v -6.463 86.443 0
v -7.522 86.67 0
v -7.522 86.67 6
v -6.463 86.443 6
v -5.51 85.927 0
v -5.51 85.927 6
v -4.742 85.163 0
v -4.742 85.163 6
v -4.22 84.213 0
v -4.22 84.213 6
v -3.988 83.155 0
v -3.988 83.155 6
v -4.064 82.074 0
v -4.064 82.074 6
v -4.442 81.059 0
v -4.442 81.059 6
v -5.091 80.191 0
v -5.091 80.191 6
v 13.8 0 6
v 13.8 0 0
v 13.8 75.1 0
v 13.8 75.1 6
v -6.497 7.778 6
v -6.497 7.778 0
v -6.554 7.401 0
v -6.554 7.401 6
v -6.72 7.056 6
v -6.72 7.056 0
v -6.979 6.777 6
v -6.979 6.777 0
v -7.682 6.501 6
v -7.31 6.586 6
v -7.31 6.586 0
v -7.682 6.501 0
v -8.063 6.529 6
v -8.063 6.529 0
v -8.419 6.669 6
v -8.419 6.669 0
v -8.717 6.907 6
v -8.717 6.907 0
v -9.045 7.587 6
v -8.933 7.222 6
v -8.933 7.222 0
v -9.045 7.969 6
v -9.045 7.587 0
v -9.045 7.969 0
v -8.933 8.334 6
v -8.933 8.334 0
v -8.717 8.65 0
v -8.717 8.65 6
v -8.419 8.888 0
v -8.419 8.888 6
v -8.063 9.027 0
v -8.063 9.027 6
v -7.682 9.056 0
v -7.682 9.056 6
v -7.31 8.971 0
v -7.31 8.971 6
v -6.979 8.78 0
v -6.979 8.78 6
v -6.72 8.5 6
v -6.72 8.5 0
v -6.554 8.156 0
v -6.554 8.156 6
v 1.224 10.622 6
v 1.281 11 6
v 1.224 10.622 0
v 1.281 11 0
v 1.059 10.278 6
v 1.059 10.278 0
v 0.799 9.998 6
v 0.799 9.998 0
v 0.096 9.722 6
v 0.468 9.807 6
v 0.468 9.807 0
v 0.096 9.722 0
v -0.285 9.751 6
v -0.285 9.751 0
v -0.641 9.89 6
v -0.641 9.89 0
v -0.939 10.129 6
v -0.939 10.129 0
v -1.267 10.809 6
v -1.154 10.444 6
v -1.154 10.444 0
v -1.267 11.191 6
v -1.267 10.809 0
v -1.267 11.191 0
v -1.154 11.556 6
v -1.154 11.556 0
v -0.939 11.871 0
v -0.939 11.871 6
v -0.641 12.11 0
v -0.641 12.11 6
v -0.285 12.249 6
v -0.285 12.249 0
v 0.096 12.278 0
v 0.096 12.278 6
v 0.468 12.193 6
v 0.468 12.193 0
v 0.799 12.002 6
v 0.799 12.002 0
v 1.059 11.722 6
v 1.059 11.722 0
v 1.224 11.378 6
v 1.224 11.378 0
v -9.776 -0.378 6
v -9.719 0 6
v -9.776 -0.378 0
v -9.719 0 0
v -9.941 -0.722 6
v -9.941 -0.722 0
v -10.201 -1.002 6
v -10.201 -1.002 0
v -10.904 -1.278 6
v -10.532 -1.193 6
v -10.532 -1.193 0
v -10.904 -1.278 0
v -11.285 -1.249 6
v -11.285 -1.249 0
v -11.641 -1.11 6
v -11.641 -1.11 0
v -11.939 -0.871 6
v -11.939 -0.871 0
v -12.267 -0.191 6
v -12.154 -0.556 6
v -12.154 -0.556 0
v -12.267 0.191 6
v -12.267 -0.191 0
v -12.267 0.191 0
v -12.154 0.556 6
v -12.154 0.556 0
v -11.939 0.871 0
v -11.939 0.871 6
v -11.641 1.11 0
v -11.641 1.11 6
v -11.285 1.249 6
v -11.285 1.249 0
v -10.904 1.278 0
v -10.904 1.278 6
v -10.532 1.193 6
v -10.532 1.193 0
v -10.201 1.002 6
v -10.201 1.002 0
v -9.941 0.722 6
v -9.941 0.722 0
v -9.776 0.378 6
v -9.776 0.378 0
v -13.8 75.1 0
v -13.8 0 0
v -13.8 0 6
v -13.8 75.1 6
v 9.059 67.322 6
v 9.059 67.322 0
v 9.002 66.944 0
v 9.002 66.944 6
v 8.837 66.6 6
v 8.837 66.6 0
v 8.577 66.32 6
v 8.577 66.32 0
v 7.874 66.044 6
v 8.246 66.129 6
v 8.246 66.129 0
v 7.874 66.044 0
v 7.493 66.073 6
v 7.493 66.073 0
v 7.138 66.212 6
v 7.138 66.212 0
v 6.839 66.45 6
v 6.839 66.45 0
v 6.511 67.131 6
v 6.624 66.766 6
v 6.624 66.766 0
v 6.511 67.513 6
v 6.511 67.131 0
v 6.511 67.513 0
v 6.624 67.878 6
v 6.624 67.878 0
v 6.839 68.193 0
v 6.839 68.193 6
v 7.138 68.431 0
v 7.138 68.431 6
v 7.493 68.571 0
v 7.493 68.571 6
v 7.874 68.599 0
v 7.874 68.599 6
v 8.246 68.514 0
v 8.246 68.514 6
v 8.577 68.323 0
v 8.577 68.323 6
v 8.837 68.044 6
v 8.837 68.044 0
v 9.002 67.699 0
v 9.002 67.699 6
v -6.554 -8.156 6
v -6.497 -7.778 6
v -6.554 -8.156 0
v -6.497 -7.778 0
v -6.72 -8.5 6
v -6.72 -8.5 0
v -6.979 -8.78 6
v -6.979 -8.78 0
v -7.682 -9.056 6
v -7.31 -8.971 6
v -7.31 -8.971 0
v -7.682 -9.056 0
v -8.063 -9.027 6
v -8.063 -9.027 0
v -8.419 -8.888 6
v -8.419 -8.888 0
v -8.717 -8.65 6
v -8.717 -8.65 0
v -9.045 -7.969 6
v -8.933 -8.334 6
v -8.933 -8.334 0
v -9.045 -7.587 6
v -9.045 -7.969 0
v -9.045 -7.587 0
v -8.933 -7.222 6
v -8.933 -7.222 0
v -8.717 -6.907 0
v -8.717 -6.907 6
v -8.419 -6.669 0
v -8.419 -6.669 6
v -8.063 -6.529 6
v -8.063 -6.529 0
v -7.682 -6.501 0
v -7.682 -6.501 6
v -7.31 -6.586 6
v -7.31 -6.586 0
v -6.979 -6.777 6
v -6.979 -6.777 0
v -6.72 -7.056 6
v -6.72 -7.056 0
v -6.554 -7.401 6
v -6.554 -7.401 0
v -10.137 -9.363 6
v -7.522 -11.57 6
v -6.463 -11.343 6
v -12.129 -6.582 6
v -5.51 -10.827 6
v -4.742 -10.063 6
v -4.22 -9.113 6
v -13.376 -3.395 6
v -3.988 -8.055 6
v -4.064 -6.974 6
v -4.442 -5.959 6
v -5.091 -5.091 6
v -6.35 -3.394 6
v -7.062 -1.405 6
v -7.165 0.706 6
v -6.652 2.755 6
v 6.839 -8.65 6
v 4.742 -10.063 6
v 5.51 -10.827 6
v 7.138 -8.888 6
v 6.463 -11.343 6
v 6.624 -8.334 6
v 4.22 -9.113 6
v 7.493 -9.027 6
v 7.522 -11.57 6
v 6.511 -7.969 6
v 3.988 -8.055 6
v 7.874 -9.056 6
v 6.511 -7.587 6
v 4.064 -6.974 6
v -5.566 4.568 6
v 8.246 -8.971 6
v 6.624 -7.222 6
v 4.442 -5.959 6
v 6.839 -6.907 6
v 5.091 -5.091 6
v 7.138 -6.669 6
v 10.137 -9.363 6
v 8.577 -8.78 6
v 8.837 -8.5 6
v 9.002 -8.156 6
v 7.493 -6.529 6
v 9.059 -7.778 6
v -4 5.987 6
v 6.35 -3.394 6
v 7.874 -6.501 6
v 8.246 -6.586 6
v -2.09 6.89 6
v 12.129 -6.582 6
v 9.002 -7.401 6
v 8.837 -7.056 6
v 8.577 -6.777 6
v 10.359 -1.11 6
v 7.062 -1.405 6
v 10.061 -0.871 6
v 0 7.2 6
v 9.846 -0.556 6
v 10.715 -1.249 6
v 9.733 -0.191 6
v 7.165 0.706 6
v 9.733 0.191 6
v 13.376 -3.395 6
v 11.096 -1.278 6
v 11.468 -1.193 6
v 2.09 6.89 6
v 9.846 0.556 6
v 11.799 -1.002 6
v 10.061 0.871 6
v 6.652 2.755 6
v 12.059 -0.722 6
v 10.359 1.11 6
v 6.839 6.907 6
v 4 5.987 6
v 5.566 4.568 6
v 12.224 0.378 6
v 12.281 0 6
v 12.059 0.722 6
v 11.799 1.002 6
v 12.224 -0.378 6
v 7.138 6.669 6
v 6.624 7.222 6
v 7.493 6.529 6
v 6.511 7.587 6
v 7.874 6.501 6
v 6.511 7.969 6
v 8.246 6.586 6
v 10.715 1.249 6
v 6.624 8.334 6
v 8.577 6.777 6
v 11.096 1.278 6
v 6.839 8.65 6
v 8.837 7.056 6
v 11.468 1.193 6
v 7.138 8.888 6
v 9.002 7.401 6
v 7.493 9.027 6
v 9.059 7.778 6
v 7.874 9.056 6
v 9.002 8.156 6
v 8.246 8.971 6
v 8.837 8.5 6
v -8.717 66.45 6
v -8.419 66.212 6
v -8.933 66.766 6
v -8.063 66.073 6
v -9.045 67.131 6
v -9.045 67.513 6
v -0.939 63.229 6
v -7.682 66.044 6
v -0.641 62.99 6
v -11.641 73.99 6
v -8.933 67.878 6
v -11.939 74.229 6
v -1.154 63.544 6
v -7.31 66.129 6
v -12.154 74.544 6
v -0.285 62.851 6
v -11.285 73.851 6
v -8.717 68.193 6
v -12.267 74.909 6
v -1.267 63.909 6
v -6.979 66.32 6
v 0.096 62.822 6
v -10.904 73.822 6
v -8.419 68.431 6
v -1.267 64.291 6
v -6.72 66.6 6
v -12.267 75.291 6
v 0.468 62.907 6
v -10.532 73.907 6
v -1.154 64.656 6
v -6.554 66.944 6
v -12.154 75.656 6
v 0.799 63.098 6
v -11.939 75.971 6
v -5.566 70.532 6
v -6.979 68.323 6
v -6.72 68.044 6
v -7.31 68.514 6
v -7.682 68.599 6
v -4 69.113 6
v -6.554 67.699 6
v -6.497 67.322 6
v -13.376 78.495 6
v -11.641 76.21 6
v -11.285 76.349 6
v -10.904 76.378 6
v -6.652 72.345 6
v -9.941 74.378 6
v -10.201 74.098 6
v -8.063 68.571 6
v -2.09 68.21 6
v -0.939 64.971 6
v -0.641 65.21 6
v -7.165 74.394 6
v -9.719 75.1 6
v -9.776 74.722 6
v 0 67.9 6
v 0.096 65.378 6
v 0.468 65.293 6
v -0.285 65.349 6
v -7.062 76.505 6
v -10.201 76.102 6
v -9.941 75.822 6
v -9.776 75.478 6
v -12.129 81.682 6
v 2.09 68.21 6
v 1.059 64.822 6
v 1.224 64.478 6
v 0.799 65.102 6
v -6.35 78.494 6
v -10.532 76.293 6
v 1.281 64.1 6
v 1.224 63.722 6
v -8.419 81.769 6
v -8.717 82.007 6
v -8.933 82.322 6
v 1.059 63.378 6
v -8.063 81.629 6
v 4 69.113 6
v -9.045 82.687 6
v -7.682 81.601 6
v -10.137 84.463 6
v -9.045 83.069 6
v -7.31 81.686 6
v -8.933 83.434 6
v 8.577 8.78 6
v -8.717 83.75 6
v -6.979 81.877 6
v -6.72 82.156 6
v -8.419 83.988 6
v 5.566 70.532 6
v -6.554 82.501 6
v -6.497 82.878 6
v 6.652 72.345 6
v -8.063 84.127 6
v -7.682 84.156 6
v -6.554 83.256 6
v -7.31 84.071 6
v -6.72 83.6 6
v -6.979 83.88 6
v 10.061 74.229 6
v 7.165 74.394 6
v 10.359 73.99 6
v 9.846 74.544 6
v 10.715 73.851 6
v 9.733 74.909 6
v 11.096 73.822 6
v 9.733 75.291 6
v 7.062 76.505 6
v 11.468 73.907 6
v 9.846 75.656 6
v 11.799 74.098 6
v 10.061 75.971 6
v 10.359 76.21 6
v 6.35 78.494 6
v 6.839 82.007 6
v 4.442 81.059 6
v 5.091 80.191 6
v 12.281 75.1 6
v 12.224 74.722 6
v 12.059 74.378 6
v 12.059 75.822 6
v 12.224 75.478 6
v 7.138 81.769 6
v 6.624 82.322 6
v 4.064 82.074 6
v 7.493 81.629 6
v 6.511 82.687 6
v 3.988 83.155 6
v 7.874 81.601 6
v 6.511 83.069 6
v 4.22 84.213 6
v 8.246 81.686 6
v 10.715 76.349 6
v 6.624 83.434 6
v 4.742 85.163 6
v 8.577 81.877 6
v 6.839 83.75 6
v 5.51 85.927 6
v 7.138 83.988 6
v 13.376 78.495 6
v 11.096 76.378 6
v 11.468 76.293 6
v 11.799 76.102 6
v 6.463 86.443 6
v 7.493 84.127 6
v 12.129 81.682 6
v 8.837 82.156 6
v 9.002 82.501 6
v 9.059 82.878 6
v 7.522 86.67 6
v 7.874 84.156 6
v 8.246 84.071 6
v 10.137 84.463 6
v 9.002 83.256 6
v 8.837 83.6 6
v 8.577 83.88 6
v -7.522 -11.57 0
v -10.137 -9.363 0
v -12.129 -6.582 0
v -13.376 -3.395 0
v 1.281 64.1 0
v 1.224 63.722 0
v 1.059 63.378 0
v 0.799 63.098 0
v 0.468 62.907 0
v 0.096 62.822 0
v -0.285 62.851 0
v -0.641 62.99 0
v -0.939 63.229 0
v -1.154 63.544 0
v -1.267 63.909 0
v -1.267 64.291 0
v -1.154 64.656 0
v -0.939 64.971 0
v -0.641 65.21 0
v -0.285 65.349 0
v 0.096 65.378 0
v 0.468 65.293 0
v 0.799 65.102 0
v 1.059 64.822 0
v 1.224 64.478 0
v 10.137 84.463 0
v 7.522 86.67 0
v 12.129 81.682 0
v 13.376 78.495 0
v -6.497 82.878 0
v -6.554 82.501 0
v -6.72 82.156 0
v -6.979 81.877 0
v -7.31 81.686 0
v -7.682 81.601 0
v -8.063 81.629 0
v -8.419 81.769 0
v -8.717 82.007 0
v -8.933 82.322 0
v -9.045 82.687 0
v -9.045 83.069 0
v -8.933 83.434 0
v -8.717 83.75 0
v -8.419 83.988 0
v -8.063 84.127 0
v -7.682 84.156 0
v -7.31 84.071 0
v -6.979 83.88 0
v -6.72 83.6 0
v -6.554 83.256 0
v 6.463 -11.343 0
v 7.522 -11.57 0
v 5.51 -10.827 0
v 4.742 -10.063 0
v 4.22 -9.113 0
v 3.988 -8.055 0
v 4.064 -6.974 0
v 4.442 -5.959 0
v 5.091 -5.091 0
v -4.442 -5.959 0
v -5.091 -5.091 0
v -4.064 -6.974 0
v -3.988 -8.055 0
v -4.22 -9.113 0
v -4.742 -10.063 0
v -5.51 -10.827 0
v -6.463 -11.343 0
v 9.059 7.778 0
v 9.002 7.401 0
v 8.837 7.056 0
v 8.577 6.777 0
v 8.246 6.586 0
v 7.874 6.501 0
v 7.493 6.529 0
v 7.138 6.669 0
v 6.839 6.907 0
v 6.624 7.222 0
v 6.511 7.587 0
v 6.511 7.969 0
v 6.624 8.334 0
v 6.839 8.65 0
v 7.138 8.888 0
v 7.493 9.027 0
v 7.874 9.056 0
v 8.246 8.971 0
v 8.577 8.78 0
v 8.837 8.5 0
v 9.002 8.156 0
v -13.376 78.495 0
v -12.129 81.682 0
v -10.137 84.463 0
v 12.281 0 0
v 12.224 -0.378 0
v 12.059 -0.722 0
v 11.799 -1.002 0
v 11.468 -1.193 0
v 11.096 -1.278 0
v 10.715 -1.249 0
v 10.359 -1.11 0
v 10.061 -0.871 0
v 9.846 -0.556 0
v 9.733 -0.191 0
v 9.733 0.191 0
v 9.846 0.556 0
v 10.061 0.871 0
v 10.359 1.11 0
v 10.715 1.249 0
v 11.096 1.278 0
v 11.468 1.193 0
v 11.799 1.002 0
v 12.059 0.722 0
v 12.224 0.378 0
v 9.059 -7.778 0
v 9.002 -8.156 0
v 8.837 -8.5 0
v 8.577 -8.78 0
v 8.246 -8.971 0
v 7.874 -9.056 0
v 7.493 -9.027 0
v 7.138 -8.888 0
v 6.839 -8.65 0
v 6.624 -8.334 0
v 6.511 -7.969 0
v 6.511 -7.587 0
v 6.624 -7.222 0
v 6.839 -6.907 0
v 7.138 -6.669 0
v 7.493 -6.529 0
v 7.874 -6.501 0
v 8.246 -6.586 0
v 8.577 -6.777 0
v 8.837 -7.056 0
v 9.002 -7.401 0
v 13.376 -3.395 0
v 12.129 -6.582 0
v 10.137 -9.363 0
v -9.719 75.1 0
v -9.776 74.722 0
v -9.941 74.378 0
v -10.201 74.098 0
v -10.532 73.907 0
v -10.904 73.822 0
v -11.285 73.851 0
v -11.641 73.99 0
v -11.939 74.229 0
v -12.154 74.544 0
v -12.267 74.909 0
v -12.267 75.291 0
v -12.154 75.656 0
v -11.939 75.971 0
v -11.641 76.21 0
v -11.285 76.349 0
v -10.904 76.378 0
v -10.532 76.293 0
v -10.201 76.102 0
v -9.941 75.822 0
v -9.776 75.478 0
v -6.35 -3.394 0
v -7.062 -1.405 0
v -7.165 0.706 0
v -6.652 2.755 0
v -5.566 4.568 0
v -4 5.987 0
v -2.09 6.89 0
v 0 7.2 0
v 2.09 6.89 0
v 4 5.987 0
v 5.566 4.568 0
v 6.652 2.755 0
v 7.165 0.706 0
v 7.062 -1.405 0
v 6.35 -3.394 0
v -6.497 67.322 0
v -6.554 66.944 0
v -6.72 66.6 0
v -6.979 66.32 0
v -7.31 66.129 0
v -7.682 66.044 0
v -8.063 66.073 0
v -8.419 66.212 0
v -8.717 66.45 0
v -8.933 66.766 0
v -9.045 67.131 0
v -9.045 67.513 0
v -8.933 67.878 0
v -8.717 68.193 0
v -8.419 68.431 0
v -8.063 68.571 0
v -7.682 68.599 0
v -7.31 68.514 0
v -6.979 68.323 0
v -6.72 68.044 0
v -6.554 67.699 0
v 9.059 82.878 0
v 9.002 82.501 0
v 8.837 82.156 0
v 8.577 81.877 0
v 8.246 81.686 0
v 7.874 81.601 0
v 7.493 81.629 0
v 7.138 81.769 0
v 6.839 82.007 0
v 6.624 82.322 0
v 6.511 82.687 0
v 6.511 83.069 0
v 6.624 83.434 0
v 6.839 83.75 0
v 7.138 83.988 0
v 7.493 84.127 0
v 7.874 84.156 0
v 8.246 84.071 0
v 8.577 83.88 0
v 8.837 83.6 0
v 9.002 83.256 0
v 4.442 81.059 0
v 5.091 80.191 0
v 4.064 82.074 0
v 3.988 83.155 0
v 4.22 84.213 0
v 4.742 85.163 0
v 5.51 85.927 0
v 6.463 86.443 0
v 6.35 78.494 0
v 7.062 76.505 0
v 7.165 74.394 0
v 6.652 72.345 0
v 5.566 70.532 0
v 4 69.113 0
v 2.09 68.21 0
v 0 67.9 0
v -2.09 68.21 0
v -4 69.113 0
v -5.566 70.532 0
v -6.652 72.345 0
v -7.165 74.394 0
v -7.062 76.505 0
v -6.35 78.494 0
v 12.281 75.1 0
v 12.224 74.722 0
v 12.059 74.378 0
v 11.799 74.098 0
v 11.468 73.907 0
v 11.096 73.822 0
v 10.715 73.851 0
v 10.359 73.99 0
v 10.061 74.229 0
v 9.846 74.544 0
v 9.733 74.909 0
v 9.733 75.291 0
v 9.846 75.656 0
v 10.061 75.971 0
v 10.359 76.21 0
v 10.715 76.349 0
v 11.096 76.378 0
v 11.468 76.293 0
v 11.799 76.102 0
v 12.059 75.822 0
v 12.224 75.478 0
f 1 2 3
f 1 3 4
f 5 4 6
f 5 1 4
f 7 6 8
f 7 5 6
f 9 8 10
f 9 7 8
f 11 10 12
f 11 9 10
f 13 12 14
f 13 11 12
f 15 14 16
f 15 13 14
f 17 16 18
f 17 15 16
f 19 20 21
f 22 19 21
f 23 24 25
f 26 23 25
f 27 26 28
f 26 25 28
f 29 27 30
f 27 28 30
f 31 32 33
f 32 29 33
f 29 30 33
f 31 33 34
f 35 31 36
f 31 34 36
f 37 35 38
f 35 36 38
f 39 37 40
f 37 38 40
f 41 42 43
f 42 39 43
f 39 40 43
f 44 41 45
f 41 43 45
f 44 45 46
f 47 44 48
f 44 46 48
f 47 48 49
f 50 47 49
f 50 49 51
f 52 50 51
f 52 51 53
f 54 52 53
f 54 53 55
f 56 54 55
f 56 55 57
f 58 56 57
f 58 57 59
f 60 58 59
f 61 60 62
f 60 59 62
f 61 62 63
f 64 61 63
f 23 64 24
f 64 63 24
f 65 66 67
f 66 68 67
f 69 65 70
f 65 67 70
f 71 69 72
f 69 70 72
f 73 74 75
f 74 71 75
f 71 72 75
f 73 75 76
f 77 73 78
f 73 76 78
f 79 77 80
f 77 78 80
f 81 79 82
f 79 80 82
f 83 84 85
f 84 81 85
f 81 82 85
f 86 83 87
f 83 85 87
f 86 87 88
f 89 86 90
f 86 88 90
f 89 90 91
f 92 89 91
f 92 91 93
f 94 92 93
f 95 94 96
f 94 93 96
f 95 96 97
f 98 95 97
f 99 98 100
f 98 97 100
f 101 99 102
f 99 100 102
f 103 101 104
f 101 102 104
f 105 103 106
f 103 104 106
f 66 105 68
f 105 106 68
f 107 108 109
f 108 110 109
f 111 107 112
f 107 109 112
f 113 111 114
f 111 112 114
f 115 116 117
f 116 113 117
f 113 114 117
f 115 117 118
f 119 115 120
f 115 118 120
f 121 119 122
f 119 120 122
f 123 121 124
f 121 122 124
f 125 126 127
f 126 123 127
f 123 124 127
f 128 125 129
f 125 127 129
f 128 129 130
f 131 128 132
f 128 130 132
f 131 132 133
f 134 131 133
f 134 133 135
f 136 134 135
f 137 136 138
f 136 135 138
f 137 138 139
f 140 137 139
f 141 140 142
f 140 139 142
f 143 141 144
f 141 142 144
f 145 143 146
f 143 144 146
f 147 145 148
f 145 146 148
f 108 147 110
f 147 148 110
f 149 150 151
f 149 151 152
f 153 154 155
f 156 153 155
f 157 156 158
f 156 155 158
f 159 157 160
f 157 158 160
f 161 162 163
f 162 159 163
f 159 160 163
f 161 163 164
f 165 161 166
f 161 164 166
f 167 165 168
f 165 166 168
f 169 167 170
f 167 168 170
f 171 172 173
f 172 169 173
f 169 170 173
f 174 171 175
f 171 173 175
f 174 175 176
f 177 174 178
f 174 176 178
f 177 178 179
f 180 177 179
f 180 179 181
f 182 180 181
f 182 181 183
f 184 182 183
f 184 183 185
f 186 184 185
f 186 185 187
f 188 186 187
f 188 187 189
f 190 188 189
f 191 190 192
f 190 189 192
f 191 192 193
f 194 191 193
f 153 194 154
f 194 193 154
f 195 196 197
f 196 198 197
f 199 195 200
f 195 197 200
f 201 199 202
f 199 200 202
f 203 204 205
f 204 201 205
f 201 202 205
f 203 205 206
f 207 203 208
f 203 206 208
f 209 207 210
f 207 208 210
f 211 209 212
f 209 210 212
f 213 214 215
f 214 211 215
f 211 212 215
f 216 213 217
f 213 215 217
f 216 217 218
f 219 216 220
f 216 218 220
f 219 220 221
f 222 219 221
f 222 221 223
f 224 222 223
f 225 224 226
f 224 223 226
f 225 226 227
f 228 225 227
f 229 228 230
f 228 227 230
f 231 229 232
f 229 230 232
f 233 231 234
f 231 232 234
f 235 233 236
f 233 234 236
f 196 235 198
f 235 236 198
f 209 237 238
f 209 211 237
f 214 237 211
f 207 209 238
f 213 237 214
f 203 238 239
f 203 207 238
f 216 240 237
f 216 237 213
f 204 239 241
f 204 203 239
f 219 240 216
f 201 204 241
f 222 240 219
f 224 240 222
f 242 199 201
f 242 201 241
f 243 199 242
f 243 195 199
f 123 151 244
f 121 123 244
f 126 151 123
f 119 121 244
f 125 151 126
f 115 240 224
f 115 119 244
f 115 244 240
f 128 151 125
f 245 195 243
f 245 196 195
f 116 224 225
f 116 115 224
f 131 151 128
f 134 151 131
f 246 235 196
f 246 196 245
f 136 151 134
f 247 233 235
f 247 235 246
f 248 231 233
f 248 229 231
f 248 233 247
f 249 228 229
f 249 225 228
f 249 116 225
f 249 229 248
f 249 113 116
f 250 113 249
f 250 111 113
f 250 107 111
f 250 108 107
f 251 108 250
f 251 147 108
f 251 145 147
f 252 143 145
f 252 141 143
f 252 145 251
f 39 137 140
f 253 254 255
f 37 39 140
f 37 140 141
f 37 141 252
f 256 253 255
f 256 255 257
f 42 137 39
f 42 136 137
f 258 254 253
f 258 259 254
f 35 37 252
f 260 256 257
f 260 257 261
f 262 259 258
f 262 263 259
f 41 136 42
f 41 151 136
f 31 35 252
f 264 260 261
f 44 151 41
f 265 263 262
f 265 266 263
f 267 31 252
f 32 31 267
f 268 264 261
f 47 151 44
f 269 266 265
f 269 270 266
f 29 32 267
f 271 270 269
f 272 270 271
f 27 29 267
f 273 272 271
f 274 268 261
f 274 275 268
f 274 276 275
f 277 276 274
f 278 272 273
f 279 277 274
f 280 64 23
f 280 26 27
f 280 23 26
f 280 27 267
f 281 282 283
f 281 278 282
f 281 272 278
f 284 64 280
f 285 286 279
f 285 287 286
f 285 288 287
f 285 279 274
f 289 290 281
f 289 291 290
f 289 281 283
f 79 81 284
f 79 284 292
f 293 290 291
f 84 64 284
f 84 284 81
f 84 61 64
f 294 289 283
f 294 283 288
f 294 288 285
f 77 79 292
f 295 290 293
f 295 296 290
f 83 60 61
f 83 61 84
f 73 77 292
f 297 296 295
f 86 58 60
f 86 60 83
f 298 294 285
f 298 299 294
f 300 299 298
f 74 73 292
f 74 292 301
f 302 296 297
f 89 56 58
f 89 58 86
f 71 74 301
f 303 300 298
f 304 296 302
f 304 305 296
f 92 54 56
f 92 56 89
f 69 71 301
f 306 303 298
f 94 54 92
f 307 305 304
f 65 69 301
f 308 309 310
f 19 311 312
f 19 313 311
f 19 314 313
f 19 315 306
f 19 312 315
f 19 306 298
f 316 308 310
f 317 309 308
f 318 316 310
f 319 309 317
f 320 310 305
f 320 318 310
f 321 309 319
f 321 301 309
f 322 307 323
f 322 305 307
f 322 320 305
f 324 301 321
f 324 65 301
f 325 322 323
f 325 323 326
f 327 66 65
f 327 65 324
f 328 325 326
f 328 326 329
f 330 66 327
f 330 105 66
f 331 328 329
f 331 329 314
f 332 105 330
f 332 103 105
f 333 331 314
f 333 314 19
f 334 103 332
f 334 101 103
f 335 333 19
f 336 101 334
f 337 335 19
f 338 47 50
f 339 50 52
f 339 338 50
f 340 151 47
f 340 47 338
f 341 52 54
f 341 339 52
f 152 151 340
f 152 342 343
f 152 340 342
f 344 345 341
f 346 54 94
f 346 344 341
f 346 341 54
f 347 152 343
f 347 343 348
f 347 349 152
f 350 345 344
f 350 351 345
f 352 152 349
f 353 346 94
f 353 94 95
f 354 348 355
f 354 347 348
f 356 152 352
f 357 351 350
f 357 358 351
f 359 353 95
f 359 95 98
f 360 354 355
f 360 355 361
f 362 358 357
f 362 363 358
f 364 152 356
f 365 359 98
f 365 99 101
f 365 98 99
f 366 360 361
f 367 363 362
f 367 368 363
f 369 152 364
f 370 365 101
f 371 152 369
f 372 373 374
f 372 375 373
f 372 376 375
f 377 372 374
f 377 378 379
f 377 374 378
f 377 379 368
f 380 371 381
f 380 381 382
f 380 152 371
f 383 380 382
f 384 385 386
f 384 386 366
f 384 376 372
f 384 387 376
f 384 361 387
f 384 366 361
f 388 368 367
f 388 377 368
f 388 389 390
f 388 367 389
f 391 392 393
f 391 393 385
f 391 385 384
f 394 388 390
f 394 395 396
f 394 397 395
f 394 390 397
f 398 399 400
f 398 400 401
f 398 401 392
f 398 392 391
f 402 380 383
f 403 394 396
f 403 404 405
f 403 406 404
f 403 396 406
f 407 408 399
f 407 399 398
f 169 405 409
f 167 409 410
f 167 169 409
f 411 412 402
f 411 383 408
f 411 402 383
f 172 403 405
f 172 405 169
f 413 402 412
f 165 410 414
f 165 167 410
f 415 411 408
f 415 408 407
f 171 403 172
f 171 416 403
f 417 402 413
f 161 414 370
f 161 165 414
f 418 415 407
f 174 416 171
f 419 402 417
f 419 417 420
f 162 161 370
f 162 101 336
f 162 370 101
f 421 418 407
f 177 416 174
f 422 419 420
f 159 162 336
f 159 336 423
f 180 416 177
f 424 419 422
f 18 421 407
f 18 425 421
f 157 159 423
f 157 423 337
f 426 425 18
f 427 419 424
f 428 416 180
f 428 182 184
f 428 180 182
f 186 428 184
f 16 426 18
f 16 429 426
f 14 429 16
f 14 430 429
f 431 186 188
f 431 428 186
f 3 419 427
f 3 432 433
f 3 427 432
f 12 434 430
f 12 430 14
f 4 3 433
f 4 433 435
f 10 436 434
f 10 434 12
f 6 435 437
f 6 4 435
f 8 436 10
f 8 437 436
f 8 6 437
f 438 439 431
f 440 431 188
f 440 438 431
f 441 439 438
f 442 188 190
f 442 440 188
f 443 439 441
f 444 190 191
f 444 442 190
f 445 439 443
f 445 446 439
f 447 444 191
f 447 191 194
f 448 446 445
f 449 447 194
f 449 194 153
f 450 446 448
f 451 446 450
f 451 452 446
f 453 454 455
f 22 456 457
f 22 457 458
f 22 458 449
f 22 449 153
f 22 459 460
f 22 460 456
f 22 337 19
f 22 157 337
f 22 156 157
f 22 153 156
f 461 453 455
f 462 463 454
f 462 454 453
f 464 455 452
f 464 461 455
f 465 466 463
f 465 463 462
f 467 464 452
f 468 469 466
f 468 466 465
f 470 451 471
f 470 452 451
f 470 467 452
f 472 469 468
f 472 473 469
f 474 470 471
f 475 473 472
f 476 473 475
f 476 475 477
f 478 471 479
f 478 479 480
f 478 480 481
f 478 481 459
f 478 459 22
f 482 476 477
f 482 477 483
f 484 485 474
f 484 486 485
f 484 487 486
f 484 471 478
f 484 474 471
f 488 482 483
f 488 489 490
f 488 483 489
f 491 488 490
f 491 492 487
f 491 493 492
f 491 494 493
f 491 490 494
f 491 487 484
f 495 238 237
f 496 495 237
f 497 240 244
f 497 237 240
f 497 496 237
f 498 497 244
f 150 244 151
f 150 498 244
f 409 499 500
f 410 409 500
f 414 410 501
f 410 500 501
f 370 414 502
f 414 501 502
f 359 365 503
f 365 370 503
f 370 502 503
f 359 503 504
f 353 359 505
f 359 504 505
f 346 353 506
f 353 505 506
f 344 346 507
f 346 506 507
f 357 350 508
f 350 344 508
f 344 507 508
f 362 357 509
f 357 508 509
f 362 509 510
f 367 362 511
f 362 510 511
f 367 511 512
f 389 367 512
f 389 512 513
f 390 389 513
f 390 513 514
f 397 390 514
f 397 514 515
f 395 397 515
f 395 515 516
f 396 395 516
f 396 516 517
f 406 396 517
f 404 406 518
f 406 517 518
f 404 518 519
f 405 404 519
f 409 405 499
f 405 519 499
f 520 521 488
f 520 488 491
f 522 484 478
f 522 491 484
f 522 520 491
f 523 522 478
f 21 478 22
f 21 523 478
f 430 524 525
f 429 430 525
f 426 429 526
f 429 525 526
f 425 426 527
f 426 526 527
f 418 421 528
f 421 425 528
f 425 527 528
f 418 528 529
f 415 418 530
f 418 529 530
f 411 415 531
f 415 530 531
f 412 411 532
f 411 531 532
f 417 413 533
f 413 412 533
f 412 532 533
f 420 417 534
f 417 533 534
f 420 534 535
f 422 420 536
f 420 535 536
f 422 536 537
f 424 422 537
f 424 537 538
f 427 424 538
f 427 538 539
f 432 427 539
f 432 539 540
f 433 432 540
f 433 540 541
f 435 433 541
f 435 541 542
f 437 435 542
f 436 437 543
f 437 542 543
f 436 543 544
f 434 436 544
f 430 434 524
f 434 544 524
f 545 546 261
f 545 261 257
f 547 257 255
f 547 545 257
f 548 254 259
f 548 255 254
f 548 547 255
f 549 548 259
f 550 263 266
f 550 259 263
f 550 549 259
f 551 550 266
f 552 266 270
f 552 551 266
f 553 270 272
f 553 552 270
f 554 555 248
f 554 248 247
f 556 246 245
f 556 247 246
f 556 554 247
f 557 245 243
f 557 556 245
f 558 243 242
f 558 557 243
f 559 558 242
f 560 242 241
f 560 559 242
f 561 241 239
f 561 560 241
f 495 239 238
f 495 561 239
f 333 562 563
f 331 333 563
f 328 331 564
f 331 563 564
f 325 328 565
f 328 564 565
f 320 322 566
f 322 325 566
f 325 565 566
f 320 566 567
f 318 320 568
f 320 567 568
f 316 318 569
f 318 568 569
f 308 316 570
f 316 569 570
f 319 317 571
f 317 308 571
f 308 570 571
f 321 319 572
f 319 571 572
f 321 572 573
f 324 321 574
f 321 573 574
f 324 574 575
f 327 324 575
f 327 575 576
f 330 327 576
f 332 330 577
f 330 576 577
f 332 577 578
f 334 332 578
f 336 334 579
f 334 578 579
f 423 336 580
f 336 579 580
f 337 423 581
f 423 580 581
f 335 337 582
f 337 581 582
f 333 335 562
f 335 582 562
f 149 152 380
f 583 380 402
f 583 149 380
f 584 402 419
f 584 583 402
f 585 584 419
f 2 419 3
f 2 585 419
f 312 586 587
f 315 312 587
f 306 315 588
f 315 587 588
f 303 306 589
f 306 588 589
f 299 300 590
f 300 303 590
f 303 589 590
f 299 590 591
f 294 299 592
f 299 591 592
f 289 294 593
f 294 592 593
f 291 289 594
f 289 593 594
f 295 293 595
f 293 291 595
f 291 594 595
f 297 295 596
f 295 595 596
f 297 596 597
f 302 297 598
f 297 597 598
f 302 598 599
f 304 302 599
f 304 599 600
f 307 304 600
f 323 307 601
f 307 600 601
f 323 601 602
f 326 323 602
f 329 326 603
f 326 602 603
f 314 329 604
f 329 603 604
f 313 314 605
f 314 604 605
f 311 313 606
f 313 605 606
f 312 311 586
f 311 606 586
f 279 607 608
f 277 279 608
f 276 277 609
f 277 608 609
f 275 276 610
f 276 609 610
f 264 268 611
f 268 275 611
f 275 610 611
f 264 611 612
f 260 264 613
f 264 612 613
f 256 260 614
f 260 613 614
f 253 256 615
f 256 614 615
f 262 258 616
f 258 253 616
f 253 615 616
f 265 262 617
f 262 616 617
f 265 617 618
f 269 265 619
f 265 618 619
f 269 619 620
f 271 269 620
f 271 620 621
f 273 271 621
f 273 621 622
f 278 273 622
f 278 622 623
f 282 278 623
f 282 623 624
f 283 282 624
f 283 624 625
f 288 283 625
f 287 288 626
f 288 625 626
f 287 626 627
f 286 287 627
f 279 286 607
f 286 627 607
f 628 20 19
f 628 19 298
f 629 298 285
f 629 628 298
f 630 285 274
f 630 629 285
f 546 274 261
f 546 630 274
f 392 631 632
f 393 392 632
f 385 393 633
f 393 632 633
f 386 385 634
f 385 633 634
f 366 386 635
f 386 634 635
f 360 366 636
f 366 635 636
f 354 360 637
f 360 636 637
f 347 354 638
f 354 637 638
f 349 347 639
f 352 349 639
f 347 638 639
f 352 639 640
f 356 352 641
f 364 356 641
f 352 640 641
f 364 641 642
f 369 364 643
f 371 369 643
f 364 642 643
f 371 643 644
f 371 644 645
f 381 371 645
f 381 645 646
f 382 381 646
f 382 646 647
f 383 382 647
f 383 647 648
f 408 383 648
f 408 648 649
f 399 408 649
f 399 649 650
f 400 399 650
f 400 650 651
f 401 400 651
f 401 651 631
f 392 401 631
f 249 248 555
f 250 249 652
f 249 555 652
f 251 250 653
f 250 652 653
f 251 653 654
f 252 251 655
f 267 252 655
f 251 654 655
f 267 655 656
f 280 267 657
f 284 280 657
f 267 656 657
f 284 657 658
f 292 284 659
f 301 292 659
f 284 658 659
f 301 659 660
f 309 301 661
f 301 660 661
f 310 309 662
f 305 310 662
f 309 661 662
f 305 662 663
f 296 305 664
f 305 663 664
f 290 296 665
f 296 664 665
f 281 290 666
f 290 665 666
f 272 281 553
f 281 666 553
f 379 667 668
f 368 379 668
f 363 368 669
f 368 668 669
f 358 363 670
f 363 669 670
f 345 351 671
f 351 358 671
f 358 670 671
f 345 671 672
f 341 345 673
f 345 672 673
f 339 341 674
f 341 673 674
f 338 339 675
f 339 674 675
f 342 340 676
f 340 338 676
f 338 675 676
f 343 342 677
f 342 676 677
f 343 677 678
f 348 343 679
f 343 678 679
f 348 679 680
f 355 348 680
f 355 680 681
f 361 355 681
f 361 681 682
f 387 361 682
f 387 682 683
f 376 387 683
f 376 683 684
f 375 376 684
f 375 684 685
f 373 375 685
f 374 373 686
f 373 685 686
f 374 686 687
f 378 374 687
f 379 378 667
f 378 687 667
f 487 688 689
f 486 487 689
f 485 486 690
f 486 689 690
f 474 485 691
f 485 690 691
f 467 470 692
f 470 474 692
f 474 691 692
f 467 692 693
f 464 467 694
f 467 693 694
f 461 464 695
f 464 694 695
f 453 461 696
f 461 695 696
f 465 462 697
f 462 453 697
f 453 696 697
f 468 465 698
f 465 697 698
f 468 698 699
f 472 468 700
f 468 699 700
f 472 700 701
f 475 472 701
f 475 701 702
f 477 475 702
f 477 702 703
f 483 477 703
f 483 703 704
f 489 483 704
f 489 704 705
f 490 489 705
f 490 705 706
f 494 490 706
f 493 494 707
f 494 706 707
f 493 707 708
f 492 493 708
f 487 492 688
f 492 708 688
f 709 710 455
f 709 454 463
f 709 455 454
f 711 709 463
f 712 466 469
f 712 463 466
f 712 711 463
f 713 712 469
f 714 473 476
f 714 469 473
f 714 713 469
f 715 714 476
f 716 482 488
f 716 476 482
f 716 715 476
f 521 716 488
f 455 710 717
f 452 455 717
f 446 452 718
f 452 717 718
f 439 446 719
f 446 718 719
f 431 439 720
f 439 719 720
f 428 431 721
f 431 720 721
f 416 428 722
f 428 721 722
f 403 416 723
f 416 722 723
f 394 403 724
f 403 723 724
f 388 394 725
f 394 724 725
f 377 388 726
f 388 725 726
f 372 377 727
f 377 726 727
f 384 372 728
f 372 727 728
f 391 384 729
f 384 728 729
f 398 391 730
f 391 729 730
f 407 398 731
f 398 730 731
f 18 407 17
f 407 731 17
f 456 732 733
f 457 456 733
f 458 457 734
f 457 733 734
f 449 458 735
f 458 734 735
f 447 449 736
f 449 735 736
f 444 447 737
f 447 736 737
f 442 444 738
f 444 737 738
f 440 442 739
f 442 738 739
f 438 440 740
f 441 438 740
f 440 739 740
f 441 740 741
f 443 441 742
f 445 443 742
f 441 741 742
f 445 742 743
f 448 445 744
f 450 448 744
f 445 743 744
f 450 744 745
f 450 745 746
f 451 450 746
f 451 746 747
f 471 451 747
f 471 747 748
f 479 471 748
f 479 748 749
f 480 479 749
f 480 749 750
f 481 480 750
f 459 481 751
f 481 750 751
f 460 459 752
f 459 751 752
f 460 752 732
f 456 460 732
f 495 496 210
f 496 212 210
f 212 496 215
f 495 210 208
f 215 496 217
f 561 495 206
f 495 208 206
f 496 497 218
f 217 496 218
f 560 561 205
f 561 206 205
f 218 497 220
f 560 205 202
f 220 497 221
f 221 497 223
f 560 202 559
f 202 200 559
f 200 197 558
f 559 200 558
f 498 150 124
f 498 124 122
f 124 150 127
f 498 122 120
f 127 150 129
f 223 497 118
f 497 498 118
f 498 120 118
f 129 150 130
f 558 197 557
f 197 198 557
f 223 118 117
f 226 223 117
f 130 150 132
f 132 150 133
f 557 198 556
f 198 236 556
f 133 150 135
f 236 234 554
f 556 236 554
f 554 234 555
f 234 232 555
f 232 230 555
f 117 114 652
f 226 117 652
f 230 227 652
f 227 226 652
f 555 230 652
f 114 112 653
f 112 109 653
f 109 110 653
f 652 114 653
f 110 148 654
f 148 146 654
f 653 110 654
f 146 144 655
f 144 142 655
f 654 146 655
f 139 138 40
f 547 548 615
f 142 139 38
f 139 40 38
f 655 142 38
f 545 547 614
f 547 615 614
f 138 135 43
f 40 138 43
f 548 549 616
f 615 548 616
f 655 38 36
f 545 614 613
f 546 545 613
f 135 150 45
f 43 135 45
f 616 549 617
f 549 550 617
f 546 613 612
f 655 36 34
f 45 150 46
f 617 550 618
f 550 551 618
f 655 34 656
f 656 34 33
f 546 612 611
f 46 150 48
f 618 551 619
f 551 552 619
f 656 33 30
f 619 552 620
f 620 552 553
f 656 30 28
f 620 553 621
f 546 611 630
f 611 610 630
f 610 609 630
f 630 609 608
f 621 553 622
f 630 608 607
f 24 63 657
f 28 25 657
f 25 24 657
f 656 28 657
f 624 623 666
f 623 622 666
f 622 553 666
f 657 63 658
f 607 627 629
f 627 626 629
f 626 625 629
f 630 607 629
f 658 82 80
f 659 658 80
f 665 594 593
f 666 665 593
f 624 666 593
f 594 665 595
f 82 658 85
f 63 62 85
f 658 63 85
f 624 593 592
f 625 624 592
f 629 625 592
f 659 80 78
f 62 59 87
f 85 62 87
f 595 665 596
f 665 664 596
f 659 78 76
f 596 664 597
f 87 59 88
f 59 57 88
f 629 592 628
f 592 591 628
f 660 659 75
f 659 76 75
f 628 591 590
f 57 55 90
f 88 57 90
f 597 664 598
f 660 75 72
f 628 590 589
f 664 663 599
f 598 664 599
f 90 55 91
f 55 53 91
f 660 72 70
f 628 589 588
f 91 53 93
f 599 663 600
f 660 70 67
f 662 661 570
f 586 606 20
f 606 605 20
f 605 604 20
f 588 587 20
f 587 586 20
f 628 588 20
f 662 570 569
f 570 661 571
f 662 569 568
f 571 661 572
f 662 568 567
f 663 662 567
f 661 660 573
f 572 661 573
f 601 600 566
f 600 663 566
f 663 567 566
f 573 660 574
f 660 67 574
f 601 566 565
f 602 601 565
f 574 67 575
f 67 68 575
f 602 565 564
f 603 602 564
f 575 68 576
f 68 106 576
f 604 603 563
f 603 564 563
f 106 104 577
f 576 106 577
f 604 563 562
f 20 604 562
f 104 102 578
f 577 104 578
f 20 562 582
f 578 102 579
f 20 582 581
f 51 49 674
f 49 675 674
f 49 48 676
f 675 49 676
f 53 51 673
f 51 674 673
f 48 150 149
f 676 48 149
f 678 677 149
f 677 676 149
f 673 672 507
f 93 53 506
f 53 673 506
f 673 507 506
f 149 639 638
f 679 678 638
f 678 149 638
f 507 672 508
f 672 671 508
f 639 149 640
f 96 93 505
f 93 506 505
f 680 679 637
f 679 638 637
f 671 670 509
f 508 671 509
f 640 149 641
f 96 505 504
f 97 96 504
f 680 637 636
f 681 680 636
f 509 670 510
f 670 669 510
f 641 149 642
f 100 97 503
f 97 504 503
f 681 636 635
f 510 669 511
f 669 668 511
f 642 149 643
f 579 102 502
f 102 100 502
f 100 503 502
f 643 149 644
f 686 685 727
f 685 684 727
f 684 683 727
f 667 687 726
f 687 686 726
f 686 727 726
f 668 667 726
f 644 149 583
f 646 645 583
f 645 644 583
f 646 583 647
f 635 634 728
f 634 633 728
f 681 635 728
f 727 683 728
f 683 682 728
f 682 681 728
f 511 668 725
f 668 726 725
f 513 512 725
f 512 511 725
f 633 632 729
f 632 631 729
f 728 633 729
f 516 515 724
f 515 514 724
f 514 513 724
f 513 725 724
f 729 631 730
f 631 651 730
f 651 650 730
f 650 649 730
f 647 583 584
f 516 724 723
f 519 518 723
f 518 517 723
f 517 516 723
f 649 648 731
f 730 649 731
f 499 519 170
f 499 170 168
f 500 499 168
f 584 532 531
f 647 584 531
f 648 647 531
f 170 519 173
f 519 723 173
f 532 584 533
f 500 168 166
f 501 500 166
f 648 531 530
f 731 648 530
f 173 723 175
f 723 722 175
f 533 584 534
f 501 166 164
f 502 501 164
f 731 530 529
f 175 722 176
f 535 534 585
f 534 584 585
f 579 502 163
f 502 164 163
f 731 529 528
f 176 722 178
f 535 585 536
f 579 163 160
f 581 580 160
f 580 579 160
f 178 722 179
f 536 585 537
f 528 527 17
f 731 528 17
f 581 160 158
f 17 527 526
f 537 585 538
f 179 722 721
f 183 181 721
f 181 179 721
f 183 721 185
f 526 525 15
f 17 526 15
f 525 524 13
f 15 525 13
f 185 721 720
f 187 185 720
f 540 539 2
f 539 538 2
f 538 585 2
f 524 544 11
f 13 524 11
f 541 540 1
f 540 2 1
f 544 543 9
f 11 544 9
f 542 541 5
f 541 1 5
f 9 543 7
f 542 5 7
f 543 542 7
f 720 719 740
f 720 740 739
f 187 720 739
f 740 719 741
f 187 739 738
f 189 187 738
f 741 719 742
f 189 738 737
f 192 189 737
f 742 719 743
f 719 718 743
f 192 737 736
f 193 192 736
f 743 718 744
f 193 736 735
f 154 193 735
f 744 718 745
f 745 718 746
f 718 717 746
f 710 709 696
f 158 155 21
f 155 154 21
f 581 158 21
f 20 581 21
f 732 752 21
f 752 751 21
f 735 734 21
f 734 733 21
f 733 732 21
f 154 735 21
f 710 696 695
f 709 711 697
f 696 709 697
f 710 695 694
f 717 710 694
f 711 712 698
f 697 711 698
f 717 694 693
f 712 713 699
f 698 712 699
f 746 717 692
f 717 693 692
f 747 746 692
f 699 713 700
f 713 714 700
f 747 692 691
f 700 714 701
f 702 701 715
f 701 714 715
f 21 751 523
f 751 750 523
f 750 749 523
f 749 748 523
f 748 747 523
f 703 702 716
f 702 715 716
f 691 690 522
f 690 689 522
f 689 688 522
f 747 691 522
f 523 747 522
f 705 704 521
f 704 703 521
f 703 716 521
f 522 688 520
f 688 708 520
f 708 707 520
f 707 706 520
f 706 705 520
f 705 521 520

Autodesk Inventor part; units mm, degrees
ref_plane "YZ Plane" through (0, 0, 0) normal (1, 0, 0) x (0, 1, 0)
ref_plane "XZ Plane" through (0, 0, 0) normal (0, 1, 0) x (-1, 0, 0)
ref_plane "XY Plane" through (0, 0, 0) normal (0, 0, 1) x (1, 0, 0)
sketch "스케치1" plane through (0, 0, 0) normal (0, 0, 1) x (1, 0, 0)
  circle A0 centre (0, 0) radius 13.8 projected
  circle A1 centre (0, 0) radius 7.2 projected
  circle A2 centre (0, -11) radius 1.2812 projected
  circle A3 centre (-7.7782, -7.7782) radius 1.2812 projected
  circle A4 centre (-11, 0) radius 1.2812 projected
  circle A5 centre (-7.7782, 7.7782) radius 1.2812 projected
  circle A6 centre (0, 11) radius 1.2812 projected
  circle A7 centre (7.7782, 7.7782) radius 1.2812 projected
  circle A8 centre (11, 0) radius 1.2812 projected
  circle A9 centre (7.7782, -7.7782) radius 1.2812 projected
  circle A10 centre (0, 75.1) radius 13.8 projected
  circle A11 centre (0, 75.1) radius 7.2 projected
  circle A12 centre (0, 64.1) radius 1.2812 projected
  circle A13 centre (-7.7782, 67.3218) radius 1.2812 projected
  circle A14 centre (-11, 75.1) radius 1.2812 projected
  circle A15 centre (-7.7782, 82.8782) radius 1.2812 projected
  circle A16 centre (0, 86.1) radius 1.2812 projected
  circle A17 centre (7.7782, 82.8782) radius 1.2812 projected
  circle A18 centre (11, 75.1) radius 1.2812 projected
  circle A19 centre (7.7782, 67.3218) radius 1.2812 projected
  circle A20 centre (7.7782, -7.7782) radius 3.8
  circle A21 centre (-7.7782, -7.7782) radius 3.8
  line L0 (-113.808, 75.1) -> (55.228, 75.1)
  line L1 (13.8, 0) -> (13.8, 75.1)
  line L2 (-13.8, 0) -> (-13.8, 75.1)
  circle A22 centre (7.7782, 82.8782) radius 3.8
  circle A23 centre (-7.7782, 82.8782) radius 3.8
  point P0 (0, 0)
  point P1 (5.0912, -5.0912)
  point P2 (7.5223, -11.5696)
  point P3 (7.5223, 86.6696)
  point P4 (5.0912, 80.1912)
  point P5 (-5.0912, 80.1912)
  point P6 (-7.5223, 86.6696)
  point P7 (-7.5223, -11.5696)
  point P8 (-5.0912, -5.0912)
extrude "돌출1" add sketch "스케치1" along normal blind 6 contours A0 A20 A1 A21 | A0 L2 A10 L1 | A0 A20 | L0 A18 A11 A22 A10 | A10 L0 A14 A11 A18 | A21 A0 | A10 A23 A11 L0 A14 | A22 A10 | A10 A23 picked at (4.2604, 10.6567) picked at (10.3474, -8.1187) picked at (-10.3474, -8.1187) picked at (10.3474, 83.2187) picked at (-10.3474, 83.2187)
properties part number "_shim"
